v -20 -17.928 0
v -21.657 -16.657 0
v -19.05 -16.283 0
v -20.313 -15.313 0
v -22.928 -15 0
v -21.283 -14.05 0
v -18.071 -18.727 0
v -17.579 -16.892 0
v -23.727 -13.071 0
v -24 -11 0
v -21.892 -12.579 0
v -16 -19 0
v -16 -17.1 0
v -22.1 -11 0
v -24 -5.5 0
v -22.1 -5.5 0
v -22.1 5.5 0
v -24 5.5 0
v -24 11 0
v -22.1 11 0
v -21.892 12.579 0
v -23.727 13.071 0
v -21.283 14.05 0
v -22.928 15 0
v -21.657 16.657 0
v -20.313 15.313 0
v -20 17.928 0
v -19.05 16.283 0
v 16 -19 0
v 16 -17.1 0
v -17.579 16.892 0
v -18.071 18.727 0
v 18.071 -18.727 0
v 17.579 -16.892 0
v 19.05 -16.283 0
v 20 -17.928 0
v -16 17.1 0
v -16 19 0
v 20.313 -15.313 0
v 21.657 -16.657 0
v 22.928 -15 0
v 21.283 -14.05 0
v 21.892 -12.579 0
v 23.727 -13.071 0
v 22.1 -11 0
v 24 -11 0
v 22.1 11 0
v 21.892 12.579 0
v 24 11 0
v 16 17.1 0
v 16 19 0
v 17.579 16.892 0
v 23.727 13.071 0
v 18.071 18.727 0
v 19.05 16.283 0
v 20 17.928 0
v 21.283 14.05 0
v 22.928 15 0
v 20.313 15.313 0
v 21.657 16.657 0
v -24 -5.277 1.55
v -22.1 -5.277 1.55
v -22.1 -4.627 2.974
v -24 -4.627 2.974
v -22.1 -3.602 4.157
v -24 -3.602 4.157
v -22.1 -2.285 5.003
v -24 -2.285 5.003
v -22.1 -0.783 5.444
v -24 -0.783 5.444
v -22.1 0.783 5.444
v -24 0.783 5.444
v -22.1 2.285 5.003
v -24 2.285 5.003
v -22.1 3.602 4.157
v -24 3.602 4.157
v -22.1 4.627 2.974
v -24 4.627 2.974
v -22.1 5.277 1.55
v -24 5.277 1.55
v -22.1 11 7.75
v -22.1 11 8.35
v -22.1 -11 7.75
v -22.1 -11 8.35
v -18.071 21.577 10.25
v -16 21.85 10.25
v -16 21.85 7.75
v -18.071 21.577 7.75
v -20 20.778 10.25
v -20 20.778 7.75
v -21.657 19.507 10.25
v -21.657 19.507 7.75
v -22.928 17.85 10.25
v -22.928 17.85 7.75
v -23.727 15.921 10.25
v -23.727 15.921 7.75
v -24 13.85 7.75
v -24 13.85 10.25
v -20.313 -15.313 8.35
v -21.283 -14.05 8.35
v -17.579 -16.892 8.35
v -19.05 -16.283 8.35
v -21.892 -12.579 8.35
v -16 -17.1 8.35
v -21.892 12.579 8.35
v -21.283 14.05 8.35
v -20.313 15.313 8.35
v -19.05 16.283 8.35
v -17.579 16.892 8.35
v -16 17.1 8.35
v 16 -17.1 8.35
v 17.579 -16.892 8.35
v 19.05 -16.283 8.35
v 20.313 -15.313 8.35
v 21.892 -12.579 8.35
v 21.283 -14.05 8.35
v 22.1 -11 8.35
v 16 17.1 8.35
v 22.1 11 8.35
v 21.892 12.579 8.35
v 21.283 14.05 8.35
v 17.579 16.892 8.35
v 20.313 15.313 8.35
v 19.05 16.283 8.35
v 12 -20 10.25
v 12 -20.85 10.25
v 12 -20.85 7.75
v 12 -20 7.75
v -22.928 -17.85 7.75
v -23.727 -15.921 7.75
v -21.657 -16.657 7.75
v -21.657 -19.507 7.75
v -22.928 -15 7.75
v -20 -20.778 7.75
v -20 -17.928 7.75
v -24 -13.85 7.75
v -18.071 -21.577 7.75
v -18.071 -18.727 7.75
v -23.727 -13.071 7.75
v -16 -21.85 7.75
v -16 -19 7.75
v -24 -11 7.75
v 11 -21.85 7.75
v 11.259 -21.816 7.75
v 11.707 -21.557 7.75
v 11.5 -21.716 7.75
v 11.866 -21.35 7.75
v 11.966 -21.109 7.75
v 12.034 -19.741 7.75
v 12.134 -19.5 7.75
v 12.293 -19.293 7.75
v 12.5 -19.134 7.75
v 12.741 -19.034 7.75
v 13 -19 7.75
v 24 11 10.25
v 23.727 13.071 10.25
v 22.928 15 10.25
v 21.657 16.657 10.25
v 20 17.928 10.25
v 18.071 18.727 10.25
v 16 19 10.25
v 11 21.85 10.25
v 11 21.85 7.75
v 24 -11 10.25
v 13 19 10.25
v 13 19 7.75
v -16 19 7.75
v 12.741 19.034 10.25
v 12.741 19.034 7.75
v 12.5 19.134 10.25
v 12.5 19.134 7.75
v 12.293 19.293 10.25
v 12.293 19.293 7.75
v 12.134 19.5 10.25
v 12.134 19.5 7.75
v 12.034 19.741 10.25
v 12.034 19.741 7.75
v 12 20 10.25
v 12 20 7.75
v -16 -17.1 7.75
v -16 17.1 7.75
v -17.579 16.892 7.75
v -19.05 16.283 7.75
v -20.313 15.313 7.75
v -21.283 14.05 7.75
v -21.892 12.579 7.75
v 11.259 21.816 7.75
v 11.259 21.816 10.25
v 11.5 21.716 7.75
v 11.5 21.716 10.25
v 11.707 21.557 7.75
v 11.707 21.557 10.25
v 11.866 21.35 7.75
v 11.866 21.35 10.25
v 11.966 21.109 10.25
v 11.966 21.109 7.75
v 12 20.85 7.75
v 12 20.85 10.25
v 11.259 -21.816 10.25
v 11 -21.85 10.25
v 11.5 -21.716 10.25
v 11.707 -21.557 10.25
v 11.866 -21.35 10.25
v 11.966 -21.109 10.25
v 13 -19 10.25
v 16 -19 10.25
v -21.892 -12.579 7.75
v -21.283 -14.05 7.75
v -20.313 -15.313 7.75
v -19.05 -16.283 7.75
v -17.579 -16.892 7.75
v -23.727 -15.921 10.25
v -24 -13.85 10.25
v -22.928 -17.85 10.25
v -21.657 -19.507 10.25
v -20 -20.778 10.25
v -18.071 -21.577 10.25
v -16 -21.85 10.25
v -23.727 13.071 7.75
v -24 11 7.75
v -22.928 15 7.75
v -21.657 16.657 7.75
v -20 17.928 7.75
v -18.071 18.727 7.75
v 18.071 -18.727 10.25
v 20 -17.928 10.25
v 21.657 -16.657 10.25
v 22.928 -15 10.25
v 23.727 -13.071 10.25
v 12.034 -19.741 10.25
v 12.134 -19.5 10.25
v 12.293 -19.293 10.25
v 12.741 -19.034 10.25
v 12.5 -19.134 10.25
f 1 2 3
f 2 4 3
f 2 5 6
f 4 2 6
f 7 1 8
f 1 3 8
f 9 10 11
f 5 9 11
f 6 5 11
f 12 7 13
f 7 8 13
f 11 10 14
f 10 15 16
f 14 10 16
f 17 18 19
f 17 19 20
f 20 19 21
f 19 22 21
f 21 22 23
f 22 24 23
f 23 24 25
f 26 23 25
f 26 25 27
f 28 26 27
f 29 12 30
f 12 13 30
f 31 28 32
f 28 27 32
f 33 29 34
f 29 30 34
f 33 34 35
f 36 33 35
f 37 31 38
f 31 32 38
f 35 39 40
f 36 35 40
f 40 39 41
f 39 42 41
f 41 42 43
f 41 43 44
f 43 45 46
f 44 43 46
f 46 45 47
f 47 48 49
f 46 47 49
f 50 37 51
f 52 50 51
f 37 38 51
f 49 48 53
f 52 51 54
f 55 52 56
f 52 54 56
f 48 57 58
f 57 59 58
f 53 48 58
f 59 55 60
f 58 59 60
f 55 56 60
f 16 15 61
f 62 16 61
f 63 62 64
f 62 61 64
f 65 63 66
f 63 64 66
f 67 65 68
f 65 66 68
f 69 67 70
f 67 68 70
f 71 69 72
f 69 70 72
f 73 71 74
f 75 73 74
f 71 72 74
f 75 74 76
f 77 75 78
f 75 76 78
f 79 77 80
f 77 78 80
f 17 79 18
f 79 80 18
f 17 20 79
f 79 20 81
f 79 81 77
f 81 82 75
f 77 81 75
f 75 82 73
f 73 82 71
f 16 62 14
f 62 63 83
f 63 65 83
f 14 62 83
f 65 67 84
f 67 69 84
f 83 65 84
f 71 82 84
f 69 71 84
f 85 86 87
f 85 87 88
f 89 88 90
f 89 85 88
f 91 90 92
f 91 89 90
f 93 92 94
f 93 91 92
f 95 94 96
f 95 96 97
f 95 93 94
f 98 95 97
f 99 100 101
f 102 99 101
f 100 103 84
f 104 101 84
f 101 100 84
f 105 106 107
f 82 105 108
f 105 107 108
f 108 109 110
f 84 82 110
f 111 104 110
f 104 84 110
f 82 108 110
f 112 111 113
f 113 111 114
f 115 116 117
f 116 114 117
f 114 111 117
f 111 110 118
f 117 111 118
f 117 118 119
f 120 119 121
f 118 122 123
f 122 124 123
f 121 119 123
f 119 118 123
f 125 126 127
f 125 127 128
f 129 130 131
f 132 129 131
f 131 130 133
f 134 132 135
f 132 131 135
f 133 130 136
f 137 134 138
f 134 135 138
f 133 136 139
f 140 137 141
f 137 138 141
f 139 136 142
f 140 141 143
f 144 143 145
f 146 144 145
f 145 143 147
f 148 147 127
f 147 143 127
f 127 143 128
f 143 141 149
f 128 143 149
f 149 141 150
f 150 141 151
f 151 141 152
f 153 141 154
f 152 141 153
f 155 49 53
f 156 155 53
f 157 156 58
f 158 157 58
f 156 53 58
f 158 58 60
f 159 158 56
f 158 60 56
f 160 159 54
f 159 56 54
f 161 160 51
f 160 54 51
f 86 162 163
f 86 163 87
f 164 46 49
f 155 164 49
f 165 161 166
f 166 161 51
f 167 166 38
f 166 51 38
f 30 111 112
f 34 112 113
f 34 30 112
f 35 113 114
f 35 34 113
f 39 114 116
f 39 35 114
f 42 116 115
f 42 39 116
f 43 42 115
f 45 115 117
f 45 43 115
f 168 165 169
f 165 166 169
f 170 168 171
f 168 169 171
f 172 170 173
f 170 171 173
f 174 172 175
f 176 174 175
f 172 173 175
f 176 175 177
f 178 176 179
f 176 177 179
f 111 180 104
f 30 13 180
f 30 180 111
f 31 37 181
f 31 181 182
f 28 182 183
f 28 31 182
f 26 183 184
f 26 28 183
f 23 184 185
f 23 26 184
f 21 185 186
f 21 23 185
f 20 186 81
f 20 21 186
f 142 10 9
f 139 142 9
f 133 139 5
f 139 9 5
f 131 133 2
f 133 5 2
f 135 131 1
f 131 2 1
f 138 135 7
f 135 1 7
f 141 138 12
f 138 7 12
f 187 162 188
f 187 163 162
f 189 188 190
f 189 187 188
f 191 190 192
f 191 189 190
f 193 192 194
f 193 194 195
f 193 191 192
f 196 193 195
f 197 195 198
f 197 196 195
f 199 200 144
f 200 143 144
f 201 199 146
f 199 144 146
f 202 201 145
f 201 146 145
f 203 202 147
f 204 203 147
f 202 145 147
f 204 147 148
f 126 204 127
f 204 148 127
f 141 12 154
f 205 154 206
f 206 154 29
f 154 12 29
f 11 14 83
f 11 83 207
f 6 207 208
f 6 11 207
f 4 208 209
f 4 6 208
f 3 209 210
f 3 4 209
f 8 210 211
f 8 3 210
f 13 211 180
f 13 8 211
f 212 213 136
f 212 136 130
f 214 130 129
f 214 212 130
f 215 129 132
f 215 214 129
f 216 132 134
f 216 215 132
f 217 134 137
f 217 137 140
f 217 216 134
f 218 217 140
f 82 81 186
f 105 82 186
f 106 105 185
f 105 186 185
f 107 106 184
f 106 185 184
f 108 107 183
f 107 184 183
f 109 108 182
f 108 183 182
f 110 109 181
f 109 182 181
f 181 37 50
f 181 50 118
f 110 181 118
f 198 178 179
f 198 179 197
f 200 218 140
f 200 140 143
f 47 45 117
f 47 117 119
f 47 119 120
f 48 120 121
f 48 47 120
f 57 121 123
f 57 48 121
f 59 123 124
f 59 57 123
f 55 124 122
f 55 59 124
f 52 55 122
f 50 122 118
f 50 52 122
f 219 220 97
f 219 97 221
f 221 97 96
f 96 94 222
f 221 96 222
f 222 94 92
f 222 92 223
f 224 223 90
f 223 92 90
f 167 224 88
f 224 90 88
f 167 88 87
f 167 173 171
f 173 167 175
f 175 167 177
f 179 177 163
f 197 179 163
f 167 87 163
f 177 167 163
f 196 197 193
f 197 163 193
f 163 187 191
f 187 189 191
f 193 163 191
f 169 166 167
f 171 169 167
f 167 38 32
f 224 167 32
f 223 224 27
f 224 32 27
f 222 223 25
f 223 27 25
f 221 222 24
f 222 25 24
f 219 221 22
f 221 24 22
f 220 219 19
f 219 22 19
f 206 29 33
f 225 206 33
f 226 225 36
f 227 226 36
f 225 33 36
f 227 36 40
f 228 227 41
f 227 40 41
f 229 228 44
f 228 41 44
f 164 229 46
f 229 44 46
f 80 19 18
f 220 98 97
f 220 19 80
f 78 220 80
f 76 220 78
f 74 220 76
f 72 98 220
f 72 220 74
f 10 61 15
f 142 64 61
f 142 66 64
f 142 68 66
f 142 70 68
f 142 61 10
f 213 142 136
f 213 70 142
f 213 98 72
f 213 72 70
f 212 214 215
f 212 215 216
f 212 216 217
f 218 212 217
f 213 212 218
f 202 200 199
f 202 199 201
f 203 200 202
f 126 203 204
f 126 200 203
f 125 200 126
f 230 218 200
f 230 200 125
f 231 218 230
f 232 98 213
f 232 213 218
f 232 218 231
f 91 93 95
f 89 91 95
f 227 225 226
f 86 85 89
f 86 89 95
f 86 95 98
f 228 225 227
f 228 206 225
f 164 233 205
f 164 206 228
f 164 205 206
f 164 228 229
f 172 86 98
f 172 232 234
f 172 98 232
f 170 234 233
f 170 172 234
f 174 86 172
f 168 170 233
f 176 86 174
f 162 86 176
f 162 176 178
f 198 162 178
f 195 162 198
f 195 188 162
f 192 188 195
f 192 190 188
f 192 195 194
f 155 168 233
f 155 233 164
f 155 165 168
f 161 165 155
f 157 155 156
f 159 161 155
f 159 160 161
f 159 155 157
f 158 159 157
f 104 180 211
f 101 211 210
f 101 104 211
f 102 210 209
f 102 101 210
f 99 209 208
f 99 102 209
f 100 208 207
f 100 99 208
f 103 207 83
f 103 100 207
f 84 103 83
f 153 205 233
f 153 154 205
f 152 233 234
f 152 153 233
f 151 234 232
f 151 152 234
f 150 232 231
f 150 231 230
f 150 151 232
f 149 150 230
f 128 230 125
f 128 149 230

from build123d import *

# Parameters (mm, degrees)
F1_DEPTH     = 10.25
F3_DEPTH     = 2.5
F4_R         = 1
F5_T         = 1.9
F5_T3_DEPTH  = 4.8
F5_T5_DEPTH  = 31.8
F5_T8_ANGLE  = 90.000000001
F5_T10_ANGLE = 90.000000001
F6_R         = 5.5
F7_DEPTH     = 2


# Not quite as in the source:
# - a shell that OpenCascade refuses in one call is made with other operations: the cavity is built on its own and cut out


with BuildPart() as f1:
    # F0 (on Top) → F1 (new body)
    with BuildSketch(Plane.XY):
        with BuildLine():
            Line((16, 19), (-16, 19))
            ThreePointArc((-16, 19), (-21.6568542495, 16.6568542495), (-24, 11))
            Line((-24, 11), (-24, -11))
            ThreePointArc((-24, -11), (-21.6568542495, -16.6568542495), (-16, -19))
            Line((-16, -19), (16, -19))
            ThreePointArc((16, -19), (21.6568542495, -16.6568542495), (24, -11))
            Line((24, -11), (24, 11))
            ThreePointArc((24, 11), (21.6568542495, 16.6568542495), (16, 19))
        make_face()
    extrude(amount=F1_DEPTH)

    # F2 (on face) → F3 (join)
    with BuildSketch(Plane.XY.offset(10.25)):
        with BuildLine():
            Line((12, 21.85), (-16, 21.85))
            ThreePointArc((-16, 21.85), (-21.6568542495, 19.5068542495), (-24, 13.85))
            Line((-24, 13.85), (-24, 11))
            ThreePointArc((-24, 11), (-21.6568542495, 16.6568542495), (-16, 19))
            Line((-16, 19), (12, 19))
            Line((12, 19), (12, 21.85))
        make_face()
        with BuildLine():
            Line((12, -21.85), (12, -19))
            Line((12, -19), (-16, -19))
            ThreePointArc((-16, -19), (-21.6568542495, -16.6568542495), (-24, -11))
            Line((-24, -11), (-24, -13.85))
            ThreePointArc((-24, -13.85), (-21.6568542495, -19.5068542495), (-16, -21.85))
            Line((-16, -21.85), (12, -21.85))
        make_face()
    extrude(amount=-F3_DEPTH)

    # F4
    f4_edges = [f1.edges().sort_by_distance(p)[0] for p in [
        (12, -21.85, 9),
        (12, -19, 9),
        (12, 19, 9),
        (12, 21.85, 9),
    ]]
    fillet(f4_edges, radius=F4_R)

    # F5: shell of thickness 1.9, made by hand


with BuildPart() as f5_core1:
    # F5_t2: copy of F1
    add(f1.part)

    # the walls: a layer under each face that stays
    f5_faces = [f5_core1.faces().sort_by_distance(p)[0] for p in [
        (0, 19, 5.125),
        (0, 0, 10.25),
        (12.2928932188, 19.2928932188, 9),
        (21.6568542495, 16.6568542495, 5.125),
        (-17.8333333333, 20.0416666667, 7.75),
        (-21.6568542495, 16.6568542495, 3.875),
        (12, 20.425, 9),
        (24, 0, 5.125),
        (21.6568542495, -16.6568542495, 5.125),
        (-2.5, 21.85, 9),
        (0, -19, 5.125),
        (-21.6568542495, 19.5068542495, 9),
        (12.2928932188, -19.2928932188, 9),
        (-24, 0, 5.125),
        (12, -20.425, 9),
        (-21.6568542495, -19.5068542495, 9),
        (-2.5, -21.85, 9),
        (-21.6568542495, -16.6568542495, 3.875),
        (-17.8333333333, -20.0416666667, 7.75),
    ]]
    thicken(f5_faces, amount=-F5_T, mode=Mode.SUBTRACT)

    # F5_s4 → F5_t3 (cut)
    with BuildSketch(Plane.YZ.offset(10.1)):
        Polygon((19.019, 7.731), (17.1, 7.75), (17.1, 9.65), (19, 9.65), align=None)
        Polygon((-19.019, 7.731), (-17.1, 7.75), (-17.1, 9.65), (-19, 9.65), align=None)
    extrude(amount=F5_T3_DEPTH, mode=Mode.SUBTRACT)

    # F5_s6 → F5_t5 (cut)
    with BuildSketch(Plane.YZ.offset(-17.9)):
        Polygon((19.019, 7.731), (17.1, 7.75), (17.1, 9.65), (19, 9.65), align=None)
        Polygon((-19.019, 7.731), (-17.1, 7.75), (-17.1, 9.65), (-19, 9.65), align=None)
    extrude(amount=F5_T5_DEPTH, mode=Mode.SUBTRACT)

    # F5_s7 → F5_t8 (revolve, cut)
    with BuildSketch(Plane.XZ.offset(-11)):
        Polygon((-24.019, 7.731), (-24, 9.65), (-22.1, 9.65), (-22.1, 7.75), align=None)
    revolve(axis=Axis((-16, 11, 7.75), (0, 0, -1)), revolution_arc=F5_T8_ANGLE, mode=Mode.SUBTRACT)

    # F5_s9 → F5_t10 (revolve, cut)
    with BuildSketch(Plane.YZ.offset(-16)):
        Polygon((-19.019, 7.731), (-17.1, 7.75), (-17.1, 9.65), (-19, 9.65), align=None)
    revolve(axis=Axis((-16, -11, 7.75), (0, 0, -1)), revolution_arc=F5_T10_ANGLE, mode=Mode.SUBTRACT)


with BuildPart() as f1_1:
    add(f1.part)

    # what is left inside the walls is the cavity
    f5_cavity = [f5_core1.part.solids().sort_by_distance(p)[0] for p in [
        (0, -5.7, 8.331),
    ]]
    add(f5_cavity, mode=Mode.SUBTRACT)

    # F6 (on face) → F7 (cut)
    with BuildSketch(Plane(origin=(-24, 0, 0), x_dir=(0, -1, 0), z_dir=(-1, 0, 0))):
        Circle(F6_R)
    extrude(amount=-F7_DEPTH, mode=Mode.SUBTRACT)


solid = f1_1.part
